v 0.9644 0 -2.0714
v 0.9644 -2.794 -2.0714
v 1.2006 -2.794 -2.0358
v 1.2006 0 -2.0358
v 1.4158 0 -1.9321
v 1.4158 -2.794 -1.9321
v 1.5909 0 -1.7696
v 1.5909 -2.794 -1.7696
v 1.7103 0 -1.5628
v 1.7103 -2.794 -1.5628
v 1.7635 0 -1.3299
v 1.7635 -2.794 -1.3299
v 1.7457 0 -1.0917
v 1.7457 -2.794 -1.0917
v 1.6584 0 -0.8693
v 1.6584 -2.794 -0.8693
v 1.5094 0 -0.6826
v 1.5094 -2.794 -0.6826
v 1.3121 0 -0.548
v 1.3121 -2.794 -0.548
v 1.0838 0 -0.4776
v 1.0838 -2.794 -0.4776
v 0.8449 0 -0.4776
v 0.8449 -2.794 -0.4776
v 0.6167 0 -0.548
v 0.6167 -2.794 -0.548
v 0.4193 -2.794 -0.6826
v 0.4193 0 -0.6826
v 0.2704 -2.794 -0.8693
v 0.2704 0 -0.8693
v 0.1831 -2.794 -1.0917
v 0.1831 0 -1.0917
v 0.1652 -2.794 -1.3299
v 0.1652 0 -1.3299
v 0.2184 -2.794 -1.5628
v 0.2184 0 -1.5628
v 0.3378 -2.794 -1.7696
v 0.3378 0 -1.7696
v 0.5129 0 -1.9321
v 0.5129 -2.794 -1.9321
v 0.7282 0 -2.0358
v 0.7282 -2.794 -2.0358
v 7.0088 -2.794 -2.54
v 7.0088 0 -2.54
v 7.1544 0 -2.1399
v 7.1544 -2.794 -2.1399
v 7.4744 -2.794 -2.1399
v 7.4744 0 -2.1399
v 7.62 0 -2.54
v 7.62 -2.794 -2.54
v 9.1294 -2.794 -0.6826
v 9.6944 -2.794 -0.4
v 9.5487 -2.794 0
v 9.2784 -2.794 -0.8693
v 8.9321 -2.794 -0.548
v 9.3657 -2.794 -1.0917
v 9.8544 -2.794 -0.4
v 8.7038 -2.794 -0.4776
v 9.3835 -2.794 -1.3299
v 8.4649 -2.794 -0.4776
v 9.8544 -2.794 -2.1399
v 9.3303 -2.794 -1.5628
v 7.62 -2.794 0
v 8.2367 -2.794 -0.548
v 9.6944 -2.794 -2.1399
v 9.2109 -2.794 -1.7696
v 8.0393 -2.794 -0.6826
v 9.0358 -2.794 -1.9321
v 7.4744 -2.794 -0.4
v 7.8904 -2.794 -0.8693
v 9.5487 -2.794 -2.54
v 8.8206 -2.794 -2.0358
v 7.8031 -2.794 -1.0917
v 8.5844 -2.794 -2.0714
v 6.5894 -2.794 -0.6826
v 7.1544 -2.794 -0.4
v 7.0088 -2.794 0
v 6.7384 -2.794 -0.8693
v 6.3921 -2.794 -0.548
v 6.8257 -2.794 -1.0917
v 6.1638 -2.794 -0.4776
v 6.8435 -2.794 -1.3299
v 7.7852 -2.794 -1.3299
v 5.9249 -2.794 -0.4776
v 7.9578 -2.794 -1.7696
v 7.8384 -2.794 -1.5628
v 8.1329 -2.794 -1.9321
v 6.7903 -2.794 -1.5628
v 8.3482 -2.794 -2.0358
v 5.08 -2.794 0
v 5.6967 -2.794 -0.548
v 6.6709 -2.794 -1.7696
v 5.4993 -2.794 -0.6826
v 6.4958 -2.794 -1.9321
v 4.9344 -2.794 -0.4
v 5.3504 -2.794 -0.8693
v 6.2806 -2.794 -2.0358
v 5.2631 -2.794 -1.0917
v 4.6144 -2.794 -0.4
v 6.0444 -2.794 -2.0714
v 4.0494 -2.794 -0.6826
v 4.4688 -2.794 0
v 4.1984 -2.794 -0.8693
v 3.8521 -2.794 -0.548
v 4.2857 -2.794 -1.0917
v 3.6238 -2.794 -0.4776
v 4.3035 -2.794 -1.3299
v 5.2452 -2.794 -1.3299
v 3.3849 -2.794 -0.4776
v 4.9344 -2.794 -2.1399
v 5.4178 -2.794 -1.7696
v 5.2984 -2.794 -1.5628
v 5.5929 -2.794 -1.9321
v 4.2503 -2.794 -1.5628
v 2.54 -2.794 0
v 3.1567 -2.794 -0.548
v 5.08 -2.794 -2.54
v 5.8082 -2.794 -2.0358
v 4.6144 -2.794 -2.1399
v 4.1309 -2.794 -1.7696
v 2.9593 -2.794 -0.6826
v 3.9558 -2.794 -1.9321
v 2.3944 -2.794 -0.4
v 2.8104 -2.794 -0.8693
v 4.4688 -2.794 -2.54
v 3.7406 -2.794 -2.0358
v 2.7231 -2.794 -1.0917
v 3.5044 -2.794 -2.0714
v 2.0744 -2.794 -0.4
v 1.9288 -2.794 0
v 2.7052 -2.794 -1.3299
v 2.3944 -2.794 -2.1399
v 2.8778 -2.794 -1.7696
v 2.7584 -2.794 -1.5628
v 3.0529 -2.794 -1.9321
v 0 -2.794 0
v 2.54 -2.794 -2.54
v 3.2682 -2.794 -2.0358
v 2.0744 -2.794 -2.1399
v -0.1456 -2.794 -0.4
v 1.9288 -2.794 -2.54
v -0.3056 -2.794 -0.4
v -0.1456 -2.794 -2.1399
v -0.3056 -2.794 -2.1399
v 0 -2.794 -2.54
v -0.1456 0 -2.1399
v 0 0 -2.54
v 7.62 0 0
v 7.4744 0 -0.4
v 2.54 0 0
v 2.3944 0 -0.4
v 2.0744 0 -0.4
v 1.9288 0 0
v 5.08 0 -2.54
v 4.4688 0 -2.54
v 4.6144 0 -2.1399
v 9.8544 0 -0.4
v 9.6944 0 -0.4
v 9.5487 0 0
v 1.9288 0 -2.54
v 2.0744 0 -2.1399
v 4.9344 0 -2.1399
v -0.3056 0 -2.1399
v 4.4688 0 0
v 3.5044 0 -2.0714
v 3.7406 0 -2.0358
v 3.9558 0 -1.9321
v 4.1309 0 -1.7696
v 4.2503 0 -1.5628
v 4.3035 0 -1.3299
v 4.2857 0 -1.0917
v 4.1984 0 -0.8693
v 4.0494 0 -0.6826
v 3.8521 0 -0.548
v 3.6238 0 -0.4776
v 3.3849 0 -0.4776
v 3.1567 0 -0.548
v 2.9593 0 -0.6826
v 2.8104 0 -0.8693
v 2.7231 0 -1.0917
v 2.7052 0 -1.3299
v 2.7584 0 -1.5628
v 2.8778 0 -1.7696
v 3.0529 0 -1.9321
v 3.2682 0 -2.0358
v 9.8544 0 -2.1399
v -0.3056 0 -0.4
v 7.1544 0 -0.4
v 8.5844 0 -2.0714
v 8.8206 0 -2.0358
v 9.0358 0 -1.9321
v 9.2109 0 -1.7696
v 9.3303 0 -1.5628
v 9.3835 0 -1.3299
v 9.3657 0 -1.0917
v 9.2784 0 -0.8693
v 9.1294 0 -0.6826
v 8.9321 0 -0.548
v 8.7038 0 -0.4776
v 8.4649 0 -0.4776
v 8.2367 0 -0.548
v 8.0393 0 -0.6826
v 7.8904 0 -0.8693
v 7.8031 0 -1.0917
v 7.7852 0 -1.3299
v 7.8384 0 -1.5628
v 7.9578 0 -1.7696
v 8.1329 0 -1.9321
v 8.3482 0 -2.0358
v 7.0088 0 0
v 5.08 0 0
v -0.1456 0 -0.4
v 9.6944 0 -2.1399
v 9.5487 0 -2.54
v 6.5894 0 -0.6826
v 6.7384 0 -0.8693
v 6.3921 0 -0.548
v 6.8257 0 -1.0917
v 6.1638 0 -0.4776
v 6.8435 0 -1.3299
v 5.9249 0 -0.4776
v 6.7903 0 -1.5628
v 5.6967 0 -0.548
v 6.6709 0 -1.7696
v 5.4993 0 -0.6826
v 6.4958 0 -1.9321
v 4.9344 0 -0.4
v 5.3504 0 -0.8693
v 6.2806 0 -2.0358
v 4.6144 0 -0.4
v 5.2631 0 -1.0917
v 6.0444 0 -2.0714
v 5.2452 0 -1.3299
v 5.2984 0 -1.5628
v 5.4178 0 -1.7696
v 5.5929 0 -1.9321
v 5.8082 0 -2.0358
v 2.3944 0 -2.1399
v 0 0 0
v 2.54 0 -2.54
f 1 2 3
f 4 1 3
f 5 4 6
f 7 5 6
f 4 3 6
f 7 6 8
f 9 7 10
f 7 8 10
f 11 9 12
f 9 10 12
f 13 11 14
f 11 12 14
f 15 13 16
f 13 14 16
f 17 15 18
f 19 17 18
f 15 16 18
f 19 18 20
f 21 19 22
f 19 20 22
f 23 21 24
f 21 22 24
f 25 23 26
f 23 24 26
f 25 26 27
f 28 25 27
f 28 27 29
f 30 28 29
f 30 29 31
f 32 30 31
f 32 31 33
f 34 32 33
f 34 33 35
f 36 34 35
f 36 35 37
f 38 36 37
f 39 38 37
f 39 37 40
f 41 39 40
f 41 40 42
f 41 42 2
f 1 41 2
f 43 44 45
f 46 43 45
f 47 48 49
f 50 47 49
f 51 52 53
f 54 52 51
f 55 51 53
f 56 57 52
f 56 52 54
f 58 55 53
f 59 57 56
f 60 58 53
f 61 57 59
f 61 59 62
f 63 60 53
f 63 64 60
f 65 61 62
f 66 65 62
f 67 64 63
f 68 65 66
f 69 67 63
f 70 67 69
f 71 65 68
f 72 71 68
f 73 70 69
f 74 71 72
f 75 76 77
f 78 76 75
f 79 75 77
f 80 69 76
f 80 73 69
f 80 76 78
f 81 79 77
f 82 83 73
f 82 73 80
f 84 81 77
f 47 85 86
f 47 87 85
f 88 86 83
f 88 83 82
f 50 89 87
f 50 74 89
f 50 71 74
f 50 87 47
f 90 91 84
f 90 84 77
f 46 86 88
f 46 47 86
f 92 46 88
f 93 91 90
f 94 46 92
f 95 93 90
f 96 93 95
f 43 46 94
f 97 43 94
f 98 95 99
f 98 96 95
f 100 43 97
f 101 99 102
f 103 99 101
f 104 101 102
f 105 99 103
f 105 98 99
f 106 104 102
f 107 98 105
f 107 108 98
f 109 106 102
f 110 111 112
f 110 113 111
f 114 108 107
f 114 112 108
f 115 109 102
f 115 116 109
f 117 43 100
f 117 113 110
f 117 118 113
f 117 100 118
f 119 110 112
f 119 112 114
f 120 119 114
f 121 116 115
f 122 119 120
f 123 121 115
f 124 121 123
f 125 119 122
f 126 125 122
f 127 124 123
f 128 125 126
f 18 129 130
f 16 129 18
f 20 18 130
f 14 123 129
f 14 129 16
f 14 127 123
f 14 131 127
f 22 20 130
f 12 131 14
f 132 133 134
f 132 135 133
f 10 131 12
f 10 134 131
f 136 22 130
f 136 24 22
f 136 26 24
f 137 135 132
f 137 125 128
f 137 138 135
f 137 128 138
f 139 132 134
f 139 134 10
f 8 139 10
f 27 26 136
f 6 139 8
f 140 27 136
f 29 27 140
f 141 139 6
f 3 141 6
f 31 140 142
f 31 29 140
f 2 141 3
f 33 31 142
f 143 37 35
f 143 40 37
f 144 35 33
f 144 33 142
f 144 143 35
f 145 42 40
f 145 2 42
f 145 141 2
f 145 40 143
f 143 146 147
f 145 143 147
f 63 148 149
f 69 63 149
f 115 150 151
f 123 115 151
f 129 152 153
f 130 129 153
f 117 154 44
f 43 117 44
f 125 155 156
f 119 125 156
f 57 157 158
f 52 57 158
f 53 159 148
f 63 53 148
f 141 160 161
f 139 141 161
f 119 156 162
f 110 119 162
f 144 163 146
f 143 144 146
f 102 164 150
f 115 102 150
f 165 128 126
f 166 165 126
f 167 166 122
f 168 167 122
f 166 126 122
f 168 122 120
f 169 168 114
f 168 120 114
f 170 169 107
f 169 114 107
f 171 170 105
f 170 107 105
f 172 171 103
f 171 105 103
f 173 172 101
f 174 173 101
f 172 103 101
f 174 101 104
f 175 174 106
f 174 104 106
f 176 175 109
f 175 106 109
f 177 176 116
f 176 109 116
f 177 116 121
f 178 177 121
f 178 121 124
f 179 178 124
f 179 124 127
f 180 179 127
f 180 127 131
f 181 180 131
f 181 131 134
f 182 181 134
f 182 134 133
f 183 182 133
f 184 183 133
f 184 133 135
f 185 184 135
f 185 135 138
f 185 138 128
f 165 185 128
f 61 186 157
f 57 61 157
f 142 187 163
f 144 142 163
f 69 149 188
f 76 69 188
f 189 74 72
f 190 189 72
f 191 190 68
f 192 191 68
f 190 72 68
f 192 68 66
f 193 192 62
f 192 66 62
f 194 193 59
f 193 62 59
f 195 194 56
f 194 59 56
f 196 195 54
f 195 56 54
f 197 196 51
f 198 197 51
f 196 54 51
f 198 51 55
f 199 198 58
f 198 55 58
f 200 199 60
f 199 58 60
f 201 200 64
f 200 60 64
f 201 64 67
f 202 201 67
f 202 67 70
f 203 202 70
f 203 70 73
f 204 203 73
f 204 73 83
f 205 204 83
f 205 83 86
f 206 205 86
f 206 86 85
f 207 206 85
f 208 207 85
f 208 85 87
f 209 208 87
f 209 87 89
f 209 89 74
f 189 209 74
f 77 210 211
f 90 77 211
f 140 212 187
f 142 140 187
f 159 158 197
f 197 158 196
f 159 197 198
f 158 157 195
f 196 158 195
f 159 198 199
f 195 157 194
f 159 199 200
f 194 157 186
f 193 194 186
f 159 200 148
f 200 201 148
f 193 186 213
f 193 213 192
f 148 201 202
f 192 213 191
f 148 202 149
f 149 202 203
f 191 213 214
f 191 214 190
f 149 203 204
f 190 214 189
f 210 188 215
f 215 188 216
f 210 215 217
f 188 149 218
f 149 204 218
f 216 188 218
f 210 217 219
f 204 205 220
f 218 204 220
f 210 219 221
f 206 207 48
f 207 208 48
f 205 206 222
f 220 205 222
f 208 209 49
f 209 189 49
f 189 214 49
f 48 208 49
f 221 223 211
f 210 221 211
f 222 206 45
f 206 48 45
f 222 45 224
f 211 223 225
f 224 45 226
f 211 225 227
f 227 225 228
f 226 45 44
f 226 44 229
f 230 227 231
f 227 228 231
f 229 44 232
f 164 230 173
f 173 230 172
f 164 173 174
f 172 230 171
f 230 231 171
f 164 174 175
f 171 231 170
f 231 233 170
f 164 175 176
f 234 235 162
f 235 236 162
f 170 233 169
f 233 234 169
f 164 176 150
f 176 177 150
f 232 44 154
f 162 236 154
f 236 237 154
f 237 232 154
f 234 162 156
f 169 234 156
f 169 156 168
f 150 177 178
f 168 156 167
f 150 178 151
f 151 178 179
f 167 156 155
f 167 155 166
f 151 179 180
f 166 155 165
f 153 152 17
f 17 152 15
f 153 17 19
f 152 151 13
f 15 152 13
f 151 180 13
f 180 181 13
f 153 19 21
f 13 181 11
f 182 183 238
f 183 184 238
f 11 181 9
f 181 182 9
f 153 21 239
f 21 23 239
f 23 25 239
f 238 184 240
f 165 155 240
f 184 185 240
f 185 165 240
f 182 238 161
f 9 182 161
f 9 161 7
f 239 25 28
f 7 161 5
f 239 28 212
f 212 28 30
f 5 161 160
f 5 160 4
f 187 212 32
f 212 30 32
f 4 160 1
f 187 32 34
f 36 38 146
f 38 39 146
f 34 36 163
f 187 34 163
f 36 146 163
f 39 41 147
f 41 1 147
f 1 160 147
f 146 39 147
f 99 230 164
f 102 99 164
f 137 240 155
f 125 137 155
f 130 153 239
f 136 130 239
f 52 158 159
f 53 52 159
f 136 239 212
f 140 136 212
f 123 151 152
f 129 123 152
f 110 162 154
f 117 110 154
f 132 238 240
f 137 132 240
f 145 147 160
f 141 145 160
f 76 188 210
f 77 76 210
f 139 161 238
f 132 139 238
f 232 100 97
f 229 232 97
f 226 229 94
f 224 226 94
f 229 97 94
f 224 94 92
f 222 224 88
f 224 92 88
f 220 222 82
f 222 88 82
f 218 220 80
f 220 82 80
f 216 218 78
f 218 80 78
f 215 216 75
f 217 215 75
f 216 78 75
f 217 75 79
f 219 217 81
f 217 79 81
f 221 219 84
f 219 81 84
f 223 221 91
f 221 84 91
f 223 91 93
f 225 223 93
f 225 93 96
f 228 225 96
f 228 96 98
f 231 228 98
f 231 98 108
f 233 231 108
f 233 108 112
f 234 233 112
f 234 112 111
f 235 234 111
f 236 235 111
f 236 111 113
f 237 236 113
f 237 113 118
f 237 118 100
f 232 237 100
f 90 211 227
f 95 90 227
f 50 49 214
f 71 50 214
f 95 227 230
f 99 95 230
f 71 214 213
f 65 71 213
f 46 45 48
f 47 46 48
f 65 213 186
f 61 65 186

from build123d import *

# Parameters (mm, degrees)
EXTRUDE1_DEPTH  = 2.794
HOLE1_D         = 1.60274
EXTRUDE2_DEPTH  = 2.794
LPATTERN1_COUNT = 5
LPATTERN1_PITCH = 2.54
LPATTERN2_COUNT = 63
LPATTERN2_PITCH = 2.54


with BuildPart() as part:
    # Sketch1 → Extrude1 (new body)
    with BuildSketch(Plane(origin=(0, 0, 0), x_dir=(1, 0, 0), z_dir=(0, 1, 0))):
        Polygon((9.854373708, 0.40005), (9.694353708, 0.40005), (9.548747416, 0), (0, 0), (-0.145606292, 0.40005), (-0.305626292, 0.40005), (-0.305626292, 2.13995), (-0.145606292, 2.13995), (0, 2.54), (9.548747416, 2.54), (9.694353708, 2.13995), (9.854373708, 2.13995), align=None)
    extrude(amount=-EXTRUDE1_DEPTH)

    # Hole1 (through all)
    with Locations(Plane(origin=(0.964373708, 0, -1.27), x_dir=(0, 0, 1), z_dir=(0, 1, 0))):
        with Locations((0, 0)):
            hole1 = Hole(HOLE1_D / 2)

    # Sketch4 → Extrude2 (cut)
    with BuildSketch(Plane(origin=(0, 0, 0), x_dir=(1, 0, 0), z_dir=(0, 1, 0))):
        Polygon((1.928772816, 0), (2.5399746, 0), (2.394368308, 0.40005), (2.074379108, 0.40005), align=None)
        Polygon((2.074379108, 2.13995), (2.394368308, 2.13995), (2.5399746, 2.54), (1.928772816, 2.54), align=None)
    extrude2 = extrude(amount=-EXTRUDE2_DEPTH, mode=Mode.SUBTRACT)

    # LPattern1: Hole1 ×5
    with Locations(*[(i * LPATTERN1_PITCH, 0, 0) for i in range(1, LPATTERN1_COUNT)]):
        add(hole1, mode=Mode.SUBTRACT)

    # LPattern2: Extrude2 ×63
    with Locations(*[(i * LPATTERN2_PITCH, 0, 0) for i in range(1, LPATTERN2_COUNT)]):
        add(extrude2, mode=Mode.SUBTRACT)


solid = part.part
